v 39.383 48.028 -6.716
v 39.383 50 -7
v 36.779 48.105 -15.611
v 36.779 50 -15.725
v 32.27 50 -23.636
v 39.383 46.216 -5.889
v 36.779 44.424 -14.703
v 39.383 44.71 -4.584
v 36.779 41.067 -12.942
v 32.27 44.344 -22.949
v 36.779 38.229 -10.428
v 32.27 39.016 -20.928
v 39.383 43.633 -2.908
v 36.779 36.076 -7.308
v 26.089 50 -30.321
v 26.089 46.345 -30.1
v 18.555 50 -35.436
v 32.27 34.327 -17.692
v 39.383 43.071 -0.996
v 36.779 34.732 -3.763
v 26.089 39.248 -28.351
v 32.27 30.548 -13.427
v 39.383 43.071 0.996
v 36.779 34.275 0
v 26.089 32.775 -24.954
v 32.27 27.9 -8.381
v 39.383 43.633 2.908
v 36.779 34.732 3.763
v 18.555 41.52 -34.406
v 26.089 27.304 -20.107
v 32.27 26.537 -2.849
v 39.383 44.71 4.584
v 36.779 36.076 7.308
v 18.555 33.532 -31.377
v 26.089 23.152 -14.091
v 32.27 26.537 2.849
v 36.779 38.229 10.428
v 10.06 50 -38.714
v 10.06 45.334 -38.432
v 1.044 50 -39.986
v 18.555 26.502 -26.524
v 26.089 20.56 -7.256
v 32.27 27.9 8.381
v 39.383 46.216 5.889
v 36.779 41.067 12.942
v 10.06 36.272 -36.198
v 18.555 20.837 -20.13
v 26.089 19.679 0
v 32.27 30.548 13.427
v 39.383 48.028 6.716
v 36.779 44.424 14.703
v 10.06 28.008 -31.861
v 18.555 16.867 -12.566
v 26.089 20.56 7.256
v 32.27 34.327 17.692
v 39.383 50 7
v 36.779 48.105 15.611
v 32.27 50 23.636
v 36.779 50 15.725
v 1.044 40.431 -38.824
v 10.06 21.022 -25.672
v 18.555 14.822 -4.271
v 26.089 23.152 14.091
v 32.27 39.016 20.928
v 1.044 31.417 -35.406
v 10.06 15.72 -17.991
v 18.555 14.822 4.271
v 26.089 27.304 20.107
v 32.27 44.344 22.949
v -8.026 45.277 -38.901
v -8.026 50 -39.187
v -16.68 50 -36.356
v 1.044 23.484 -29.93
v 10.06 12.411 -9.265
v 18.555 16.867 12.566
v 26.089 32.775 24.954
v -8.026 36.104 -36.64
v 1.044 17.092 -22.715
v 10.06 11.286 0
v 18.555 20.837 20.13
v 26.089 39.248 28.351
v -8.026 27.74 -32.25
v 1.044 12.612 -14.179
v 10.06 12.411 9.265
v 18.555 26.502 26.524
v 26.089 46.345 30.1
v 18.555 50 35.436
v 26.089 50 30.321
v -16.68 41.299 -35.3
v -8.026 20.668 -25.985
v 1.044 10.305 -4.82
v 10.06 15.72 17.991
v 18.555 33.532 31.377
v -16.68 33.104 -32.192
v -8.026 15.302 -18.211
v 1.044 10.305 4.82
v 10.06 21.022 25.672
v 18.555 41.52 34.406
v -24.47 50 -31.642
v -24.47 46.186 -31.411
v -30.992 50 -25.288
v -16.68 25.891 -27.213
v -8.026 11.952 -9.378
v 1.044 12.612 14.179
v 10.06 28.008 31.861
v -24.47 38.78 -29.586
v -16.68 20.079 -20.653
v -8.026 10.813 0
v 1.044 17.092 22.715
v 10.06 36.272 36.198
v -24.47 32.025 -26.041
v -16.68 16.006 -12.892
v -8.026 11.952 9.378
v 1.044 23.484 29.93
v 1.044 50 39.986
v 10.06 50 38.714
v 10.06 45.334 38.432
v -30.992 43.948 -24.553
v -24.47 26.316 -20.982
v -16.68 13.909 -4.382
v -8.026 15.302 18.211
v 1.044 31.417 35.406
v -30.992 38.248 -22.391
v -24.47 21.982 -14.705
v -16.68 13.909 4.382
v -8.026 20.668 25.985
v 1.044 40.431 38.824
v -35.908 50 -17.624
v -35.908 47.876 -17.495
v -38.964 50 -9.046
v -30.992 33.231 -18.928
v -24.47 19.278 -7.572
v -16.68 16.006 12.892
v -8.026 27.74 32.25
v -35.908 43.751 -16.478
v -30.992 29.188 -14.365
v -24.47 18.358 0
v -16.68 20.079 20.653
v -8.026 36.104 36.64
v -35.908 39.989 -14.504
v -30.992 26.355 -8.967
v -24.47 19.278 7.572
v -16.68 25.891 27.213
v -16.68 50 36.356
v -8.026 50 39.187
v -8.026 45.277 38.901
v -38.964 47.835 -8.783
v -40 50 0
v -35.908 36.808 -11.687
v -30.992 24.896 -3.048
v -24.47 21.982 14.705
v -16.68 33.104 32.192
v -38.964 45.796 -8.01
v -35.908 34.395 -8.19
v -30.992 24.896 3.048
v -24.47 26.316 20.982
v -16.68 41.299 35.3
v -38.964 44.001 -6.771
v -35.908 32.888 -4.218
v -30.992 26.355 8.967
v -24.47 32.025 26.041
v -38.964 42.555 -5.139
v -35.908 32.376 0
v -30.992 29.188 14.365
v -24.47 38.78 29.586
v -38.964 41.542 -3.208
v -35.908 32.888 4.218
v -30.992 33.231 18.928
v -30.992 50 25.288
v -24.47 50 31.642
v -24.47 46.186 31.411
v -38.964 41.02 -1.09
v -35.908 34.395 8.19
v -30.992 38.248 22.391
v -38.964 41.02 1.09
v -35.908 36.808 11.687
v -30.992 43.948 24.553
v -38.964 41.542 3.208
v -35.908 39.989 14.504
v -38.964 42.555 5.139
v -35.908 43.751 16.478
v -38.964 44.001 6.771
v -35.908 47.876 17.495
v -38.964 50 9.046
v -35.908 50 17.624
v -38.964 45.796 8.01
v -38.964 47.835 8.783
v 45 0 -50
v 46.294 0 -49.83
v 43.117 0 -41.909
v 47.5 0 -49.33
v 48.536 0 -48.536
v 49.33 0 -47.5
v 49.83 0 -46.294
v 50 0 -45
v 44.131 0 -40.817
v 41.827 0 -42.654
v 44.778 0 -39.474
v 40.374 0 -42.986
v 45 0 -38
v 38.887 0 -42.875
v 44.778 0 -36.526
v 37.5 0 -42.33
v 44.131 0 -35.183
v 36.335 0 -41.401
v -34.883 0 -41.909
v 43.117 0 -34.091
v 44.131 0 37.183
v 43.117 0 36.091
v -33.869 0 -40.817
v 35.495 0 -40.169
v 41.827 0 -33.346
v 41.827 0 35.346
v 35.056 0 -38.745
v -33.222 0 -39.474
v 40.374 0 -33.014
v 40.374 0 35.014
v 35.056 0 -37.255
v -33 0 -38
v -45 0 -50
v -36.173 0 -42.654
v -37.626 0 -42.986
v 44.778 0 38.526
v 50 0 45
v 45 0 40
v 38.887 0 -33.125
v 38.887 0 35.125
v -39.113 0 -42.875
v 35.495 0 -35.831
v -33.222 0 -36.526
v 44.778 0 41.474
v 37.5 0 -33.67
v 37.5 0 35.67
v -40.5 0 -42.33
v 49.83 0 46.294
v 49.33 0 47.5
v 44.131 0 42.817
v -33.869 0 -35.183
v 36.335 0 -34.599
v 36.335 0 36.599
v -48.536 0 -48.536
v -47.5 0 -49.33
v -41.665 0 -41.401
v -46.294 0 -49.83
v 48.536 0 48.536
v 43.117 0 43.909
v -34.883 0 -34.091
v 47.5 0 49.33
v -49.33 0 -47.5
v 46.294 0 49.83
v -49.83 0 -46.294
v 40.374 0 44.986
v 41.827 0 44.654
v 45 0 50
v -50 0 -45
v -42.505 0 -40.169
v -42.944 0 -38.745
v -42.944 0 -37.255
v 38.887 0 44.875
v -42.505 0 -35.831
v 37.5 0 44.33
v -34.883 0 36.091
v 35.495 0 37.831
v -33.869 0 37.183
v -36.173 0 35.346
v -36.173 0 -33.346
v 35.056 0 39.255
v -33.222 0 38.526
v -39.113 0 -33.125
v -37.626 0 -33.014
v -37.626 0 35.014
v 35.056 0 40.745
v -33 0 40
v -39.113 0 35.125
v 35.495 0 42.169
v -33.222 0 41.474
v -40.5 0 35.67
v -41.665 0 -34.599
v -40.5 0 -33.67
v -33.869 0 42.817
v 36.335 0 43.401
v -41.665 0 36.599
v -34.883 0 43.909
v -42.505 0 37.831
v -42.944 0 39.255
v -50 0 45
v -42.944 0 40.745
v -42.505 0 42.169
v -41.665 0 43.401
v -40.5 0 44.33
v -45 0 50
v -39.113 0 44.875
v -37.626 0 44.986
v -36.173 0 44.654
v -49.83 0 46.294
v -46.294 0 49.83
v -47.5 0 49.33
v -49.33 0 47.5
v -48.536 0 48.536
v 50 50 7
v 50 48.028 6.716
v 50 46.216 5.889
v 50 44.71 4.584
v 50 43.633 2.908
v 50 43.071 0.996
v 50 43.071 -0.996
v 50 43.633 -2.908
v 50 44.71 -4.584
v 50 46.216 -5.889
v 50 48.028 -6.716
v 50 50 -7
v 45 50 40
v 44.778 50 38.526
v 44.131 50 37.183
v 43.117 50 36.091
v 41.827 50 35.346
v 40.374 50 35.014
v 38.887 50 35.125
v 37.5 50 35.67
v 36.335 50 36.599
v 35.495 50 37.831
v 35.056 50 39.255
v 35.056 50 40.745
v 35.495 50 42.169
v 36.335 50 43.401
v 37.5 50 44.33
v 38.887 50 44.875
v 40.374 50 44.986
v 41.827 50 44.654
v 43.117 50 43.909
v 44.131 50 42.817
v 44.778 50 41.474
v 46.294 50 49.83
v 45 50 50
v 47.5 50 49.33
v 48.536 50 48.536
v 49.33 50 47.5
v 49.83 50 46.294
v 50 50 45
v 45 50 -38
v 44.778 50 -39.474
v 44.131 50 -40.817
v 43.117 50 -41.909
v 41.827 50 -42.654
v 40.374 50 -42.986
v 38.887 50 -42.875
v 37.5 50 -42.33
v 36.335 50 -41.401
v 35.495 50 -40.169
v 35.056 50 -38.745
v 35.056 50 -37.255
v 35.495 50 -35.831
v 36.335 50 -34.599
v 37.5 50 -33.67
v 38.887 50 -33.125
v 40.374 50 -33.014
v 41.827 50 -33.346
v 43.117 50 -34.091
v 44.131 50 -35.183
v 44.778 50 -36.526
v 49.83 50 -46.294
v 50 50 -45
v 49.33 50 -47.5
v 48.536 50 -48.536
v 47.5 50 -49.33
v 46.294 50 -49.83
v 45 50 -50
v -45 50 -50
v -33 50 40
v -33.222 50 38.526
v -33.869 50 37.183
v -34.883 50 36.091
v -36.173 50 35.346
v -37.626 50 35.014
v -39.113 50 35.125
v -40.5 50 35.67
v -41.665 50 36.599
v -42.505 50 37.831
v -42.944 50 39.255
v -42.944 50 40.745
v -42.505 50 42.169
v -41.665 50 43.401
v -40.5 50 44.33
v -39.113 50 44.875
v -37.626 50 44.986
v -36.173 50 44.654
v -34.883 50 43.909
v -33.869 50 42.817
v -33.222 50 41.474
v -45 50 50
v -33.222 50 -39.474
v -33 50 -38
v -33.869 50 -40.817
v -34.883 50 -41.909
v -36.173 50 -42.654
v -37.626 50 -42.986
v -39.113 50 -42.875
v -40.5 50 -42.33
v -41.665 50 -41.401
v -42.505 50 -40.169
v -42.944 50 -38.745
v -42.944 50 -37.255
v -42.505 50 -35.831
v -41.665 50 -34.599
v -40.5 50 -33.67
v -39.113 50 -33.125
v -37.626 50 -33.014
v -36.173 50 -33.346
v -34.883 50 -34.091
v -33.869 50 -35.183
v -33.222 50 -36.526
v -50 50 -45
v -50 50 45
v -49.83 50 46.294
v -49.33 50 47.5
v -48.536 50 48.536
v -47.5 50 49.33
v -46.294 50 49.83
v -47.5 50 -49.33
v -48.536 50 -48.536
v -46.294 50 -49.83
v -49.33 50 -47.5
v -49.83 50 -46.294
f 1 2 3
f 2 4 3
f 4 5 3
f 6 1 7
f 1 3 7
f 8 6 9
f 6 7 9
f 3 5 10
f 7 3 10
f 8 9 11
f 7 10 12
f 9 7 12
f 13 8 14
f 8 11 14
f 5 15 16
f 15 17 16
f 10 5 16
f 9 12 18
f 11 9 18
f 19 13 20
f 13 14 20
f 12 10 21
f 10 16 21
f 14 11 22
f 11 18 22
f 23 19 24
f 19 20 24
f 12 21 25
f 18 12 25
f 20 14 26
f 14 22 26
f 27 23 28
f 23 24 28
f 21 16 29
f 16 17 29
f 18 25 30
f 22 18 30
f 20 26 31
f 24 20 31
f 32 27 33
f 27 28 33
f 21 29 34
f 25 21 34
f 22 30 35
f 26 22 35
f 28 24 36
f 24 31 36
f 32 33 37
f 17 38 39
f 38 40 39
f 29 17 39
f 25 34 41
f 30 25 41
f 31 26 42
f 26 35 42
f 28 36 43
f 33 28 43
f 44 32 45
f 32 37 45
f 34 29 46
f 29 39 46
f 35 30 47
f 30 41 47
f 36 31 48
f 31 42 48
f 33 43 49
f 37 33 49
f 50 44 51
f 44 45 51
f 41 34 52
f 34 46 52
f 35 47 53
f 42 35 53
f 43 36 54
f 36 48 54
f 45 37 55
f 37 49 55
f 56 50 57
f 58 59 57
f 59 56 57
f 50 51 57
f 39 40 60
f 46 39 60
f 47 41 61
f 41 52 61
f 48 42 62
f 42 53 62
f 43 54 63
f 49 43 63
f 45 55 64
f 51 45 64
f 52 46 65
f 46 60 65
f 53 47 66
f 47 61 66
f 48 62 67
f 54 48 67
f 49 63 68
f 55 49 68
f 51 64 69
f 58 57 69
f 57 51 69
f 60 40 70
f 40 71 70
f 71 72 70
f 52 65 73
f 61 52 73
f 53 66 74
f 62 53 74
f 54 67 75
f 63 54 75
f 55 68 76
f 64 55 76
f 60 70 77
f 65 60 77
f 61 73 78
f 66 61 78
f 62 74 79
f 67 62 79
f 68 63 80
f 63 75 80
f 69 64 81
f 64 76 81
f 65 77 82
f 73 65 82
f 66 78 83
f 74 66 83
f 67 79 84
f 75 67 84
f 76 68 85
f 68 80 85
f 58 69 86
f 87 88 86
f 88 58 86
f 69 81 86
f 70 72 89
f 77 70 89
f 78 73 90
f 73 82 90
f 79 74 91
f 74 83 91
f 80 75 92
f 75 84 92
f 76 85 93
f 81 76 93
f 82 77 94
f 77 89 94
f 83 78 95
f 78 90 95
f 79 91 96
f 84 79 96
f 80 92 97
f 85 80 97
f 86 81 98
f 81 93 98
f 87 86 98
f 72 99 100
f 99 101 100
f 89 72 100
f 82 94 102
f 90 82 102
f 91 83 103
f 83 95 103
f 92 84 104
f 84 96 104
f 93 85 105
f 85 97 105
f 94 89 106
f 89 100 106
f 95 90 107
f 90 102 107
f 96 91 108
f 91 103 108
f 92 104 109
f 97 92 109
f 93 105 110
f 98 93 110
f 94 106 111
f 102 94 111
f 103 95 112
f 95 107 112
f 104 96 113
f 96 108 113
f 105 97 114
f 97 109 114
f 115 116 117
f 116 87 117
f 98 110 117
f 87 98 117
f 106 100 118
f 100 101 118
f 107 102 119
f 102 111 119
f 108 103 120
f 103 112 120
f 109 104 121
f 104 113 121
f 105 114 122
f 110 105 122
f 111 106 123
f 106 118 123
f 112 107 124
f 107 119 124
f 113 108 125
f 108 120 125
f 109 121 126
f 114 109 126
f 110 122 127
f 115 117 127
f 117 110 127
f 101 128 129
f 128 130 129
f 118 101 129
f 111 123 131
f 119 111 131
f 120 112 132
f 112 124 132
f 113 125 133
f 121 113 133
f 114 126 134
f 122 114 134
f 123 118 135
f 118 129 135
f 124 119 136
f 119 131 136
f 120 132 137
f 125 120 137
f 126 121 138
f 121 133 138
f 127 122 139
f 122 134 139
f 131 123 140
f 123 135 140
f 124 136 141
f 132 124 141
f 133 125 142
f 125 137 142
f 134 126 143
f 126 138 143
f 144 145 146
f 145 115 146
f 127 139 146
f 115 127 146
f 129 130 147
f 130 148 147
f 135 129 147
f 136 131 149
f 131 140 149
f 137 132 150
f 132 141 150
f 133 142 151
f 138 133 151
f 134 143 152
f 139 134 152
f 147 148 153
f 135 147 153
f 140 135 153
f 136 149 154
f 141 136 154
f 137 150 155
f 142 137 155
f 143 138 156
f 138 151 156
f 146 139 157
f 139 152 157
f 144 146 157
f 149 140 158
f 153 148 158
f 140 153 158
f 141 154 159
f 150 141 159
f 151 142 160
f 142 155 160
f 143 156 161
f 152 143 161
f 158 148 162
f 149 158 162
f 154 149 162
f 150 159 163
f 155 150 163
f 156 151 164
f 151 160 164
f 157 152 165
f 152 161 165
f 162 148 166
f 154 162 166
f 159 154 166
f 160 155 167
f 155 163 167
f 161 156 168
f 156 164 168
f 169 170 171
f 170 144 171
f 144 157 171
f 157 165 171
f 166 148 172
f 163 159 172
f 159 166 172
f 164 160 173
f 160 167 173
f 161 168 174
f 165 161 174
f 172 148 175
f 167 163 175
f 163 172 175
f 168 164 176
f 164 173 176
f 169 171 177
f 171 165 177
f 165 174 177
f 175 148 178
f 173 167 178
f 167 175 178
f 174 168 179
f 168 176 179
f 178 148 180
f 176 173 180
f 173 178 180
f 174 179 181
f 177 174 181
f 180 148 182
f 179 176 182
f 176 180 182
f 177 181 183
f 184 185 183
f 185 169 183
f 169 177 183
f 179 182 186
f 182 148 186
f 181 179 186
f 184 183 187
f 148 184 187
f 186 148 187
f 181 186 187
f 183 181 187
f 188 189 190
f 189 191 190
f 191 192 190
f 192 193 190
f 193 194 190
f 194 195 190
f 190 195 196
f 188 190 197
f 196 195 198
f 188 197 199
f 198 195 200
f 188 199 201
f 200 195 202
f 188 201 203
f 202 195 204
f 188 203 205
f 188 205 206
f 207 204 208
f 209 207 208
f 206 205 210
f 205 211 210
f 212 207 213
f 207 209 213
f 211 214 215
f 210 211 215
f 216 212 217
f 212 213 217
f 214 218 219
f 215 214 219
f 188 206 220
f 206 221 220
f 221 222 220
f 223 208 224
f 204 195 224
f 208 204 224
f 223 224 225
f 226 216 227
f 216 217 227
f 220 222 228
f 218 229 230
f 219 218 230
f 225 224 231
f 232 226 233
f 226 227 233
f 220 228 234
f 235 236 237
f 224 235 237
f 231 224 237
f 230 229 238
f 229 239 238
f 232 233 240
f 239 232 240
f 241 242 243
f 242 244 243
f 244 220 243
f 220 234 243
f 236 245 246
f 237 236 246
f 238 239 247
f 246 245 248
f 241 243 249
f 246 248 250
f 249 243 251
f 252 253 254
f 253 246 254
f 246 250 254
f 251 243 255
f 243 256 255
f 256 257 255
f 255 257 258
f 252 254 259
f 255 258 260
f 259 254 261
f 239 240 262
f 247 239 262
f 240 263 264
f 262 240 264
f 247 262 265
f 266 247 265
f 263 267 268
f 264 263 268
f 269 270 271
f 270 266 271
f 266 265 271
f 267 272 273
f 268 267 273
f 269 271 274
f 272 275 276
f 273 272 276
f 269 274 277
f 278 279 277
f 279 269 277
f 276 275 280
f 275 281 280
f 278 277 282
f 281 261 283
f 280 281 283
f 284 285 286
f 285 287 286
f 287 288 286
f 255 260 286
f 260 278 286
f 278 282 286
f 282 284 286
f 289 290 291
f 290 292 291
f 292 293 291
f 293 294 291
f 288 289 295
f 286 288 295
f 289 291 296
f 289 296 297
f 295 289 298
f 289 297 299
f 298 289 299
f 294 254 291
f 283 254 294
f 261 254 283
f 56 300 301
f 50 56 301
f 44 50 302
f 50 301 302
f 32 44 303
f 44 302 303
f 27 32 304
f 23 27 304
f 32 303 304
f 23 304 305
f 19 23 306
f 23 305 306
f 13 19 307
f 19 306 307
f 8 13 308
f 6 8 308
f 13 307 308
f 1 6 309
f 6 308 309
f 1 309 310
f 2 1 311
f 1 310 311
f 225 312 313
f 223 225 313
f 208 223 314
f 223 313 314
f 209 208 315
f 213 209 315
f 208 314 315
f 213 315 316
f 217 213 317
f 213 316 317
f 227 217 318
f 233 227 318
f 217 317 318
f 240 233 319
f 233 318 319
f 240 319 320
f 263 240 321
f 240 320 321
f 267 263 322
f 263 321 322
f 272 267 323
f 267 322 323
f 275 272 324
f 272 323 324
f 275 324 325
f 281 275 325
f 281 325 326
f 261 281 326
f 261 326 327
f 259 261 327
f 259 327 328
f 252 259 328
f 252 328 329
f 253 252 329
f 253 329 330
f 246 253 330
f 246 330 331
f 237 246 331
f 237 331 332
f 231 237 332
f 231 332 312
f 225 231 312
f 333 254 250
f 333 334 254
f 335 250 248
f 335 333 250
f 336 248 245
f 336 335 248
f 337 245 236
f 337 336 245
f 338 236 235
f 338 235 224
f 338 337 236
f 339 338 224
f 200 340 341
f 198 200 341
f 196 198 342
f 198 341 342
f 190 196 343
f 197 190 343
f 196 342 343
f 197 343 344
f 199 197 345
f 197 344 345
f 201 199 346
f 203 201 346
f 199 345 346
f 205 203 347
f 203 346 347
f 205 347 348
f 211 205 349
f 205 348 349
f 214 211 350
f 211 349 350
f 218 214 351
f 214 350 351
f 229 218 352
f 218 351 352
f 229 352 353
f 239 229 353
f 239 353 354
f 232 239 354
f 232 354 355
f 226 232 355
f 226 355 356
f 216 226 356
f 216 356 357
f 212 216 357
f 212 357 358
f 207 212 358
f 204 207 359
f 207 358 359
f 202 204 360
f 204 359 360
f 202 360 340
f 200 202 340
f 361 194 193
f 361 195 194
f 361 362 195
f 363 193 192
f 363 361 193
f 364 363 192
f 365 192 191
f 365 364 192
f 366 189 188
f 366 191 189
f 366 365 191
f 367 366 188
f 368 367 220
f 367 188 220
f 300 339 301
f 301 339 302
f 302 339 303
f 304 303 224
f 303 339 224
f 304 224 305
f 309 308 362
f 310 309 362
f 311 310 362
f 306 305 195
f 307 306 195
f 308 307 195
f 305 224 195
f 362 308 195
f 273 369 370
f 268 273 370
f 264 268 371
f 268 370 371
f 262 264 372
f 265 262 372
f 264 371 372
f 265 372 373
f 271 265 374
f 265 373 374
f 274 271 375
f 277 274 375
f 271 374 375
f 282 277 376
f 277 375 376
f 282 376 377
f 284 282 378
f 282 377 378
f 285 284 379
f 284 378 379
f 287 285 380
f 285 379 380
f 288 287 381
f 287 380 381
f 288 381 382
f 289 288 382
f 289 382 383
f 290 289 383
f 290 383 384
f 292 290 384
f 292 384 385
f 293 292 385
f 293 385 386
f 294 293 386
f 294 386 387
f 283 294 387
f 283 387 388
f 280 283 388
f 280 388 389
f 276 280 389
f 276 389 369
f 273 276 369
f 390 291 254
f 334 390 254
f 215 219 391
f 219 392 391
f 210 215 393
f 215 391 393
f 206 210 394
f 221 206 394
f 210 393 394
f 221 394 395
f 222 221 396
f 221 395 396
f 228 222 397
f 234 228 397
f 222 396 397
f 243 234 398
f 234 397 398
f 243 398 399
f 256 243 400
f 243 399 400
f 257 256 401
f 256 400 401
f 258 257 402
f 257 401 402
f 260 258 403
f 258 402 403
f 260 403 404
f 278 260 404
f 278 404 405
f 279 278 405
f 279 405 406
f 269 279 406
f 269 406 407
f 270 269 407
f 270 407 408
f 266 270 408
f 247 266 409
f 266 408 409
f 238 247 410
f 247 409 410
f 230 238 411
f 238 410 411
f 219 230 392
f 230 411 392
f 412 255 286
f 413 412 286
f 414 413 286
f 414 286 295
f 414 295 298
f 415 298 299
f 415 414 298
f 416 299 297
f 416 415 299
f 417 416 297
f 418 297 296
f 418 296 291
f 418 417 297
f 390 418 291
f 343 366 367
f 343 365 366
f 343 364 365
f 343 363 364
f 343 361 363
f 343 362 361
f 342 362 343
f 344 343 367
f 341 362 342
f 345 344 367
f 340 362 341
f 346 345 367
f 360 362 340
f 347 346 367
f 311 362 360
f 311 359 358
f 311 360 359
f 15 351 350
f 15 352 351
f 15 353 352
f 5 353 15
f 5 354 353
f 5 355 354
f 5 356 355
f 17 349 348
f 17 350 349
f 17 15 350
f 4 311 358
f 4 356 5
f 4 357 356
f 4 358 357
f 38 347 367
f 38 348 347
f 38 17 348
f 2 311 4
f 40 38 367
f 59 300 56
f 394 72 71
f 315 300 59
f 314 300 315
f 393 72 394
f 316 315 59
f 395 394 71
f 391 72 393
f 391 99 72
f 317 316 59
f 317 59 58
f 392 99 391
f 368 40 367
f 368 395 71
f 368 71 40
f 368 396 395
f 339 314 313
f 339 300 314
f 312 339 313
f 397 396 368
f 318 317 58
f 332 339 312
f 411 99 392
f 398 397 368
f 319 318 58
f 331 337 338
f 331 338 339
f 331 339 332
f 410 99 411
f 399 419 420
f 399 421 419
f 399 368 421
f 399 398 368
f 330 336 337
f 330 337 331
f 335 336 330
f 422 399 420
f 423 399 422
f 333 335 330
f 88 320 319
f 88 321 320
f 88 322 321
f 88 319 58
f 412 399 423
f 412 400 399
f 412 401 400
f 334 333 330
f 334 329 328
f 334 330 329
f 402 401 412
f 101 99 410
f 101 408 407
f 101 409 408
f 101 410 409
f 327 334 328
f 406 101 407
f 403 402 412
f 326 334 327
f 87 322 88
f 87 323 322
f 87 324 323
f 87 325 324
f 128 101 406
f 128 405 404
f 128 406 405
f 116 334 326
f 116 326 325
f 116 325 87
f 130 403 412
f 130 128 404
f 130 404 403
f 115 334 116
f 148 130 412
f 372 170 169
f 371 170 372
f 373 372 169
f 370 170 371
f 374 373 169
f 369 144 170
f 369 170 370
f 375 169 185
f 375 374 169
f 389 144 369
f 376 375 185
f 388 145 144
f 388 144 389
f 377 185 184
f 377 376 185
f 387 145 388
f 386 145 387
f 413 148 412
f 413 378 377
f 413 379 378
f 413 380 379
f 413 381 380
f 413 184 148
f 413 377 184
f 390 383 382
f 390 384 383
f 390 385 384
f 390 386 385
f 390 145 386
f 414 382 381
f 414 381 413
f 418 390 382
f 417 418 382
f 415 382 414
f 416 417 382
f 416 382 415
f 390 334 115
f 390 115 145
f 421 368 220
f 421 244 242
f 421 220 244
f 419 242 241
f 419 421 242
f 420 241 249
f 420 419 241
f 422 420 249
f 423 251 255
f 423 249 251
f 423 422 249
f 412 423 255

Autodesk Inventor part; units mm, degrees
ref_plane "YZ Plane" through (0, 0, 0) normal (1, 0, 0) x (0, 1, 0)
ref_plane "XZ Plane" through (0, 0, 0) normal (0, 1, 0) x (-1, 0, 0)
ref_plane "XY Plane" through (0, 0, 0) normal (0, 0, 1) x (1, 0, 0)
sketch "Sketch1" plane through (0, 0, 0) normal (0, 1, 0) x (-1, 0, 0)
  line L0 (50, 50) -> (-50, 50)
  line L1 (-50, 50) -> (-50, -50)
  line L2 (-50, -50) -> (50, -50)
  line L3 (50, -50) -> (50, 50)
  point P0 (0, 0)
  point P1 (50, 0)
  point P2 (0, 50)
  dimension "d0" = 100
  dimension "d1" = 100
extrude "Extrusion1" add sketch "Sketch1" along normal blind 50
sketch "Sketch2" plane through (0, 50, 0) normal (0, 1, 0) x (1, 0, 0)
  line L0 (50, -50) -> (50, 50) construction
  line L1 (50, 50) -> (-50, 50) construction
  line L2 (-50, 50) -> (-50, -50) construction
  line L3 (-50, -50) -> (50, -50) construction
  line L4 (-50, 50) -> (-50, -50) construction
  line L5 (-50, 0) -> (50, 0) construction
  line L6 (50, -50) -> (50, 50) construction
  arc A0 (40, 0) -> (-40, 0) centre (0, 0) ccw
  line L7 (-40, 0) -> (40, 0) construction
  line L8 (-40, 0) -> (40, 0)
  dimension "d4" = 80
revolve "Revolution1" cut sketch "Sketch2" angle 360 about axis through (-50, 50, 0) along (1, 0, 0)
sketch "Sketch3" plane through (0, 50, 0) normal (0, 1, 0) x (1, 0, 0)
  circle A0 centre (0, 0) radius 40 construction
  line L0 (50, -50) -> (50, 50) construction
  line L1 (50, 50) -> (-50, 50) construction
  line L2 (-50, 50) -> (-50, -50) construction
  line L3 (-50, -50) -> (50, -50) construction
  circle A1 centre (-38, 38) radius 5
  line L4 (50, 50) -> (-50, 50) construction
  line L5 (0, 50) -> (0, 0) construction
  line L6 (0, 0) -> (50, 0) construction
  line L7 (50, -50) -> (50, 50) construction
  dimension "d6" = 10
  dimension "d7" = 12
  dimension "d8" = 12
extrude "Extrusion2" cut sketch "Sketch3" against normal blind 50
pattern_linear "Rectangular Pattern1" count 2 spacing 78 along (1, 0, 0) count 2 spacing 78 along (0, 0, 1) of "Extrusion2"
sketch "Sketch4" plane through (50, 0, 50) normal (1, 0, 0) x (0, 0, -1)
  line L0 (0, 0) -> (100, 0) construction
  line L1 (100, 0) -> (100, 50) construction
  line L2 (0, 50) -> (100, 50) construction
  line L3 (0, 0) -> (0, 50) construction
  arc A0 (43, 50) -> (57, 50) centre (50, 50) ccw
  line L4 (57, 50) -> (43, 50)
  line L5 (0, 50) -> (100, 50) projected
  point P0 (50, 0)
  dimension "d17" = 7
extrude "Extrusion3" cut sketch "Sketch4" against normal up to surface
fillet "Fillet1" radius 5 4 edges at (-50, 25, 50) (50, 25, 50) (50, 25, -50) (-50, 25, -50)
properties part number "molde1-01"
